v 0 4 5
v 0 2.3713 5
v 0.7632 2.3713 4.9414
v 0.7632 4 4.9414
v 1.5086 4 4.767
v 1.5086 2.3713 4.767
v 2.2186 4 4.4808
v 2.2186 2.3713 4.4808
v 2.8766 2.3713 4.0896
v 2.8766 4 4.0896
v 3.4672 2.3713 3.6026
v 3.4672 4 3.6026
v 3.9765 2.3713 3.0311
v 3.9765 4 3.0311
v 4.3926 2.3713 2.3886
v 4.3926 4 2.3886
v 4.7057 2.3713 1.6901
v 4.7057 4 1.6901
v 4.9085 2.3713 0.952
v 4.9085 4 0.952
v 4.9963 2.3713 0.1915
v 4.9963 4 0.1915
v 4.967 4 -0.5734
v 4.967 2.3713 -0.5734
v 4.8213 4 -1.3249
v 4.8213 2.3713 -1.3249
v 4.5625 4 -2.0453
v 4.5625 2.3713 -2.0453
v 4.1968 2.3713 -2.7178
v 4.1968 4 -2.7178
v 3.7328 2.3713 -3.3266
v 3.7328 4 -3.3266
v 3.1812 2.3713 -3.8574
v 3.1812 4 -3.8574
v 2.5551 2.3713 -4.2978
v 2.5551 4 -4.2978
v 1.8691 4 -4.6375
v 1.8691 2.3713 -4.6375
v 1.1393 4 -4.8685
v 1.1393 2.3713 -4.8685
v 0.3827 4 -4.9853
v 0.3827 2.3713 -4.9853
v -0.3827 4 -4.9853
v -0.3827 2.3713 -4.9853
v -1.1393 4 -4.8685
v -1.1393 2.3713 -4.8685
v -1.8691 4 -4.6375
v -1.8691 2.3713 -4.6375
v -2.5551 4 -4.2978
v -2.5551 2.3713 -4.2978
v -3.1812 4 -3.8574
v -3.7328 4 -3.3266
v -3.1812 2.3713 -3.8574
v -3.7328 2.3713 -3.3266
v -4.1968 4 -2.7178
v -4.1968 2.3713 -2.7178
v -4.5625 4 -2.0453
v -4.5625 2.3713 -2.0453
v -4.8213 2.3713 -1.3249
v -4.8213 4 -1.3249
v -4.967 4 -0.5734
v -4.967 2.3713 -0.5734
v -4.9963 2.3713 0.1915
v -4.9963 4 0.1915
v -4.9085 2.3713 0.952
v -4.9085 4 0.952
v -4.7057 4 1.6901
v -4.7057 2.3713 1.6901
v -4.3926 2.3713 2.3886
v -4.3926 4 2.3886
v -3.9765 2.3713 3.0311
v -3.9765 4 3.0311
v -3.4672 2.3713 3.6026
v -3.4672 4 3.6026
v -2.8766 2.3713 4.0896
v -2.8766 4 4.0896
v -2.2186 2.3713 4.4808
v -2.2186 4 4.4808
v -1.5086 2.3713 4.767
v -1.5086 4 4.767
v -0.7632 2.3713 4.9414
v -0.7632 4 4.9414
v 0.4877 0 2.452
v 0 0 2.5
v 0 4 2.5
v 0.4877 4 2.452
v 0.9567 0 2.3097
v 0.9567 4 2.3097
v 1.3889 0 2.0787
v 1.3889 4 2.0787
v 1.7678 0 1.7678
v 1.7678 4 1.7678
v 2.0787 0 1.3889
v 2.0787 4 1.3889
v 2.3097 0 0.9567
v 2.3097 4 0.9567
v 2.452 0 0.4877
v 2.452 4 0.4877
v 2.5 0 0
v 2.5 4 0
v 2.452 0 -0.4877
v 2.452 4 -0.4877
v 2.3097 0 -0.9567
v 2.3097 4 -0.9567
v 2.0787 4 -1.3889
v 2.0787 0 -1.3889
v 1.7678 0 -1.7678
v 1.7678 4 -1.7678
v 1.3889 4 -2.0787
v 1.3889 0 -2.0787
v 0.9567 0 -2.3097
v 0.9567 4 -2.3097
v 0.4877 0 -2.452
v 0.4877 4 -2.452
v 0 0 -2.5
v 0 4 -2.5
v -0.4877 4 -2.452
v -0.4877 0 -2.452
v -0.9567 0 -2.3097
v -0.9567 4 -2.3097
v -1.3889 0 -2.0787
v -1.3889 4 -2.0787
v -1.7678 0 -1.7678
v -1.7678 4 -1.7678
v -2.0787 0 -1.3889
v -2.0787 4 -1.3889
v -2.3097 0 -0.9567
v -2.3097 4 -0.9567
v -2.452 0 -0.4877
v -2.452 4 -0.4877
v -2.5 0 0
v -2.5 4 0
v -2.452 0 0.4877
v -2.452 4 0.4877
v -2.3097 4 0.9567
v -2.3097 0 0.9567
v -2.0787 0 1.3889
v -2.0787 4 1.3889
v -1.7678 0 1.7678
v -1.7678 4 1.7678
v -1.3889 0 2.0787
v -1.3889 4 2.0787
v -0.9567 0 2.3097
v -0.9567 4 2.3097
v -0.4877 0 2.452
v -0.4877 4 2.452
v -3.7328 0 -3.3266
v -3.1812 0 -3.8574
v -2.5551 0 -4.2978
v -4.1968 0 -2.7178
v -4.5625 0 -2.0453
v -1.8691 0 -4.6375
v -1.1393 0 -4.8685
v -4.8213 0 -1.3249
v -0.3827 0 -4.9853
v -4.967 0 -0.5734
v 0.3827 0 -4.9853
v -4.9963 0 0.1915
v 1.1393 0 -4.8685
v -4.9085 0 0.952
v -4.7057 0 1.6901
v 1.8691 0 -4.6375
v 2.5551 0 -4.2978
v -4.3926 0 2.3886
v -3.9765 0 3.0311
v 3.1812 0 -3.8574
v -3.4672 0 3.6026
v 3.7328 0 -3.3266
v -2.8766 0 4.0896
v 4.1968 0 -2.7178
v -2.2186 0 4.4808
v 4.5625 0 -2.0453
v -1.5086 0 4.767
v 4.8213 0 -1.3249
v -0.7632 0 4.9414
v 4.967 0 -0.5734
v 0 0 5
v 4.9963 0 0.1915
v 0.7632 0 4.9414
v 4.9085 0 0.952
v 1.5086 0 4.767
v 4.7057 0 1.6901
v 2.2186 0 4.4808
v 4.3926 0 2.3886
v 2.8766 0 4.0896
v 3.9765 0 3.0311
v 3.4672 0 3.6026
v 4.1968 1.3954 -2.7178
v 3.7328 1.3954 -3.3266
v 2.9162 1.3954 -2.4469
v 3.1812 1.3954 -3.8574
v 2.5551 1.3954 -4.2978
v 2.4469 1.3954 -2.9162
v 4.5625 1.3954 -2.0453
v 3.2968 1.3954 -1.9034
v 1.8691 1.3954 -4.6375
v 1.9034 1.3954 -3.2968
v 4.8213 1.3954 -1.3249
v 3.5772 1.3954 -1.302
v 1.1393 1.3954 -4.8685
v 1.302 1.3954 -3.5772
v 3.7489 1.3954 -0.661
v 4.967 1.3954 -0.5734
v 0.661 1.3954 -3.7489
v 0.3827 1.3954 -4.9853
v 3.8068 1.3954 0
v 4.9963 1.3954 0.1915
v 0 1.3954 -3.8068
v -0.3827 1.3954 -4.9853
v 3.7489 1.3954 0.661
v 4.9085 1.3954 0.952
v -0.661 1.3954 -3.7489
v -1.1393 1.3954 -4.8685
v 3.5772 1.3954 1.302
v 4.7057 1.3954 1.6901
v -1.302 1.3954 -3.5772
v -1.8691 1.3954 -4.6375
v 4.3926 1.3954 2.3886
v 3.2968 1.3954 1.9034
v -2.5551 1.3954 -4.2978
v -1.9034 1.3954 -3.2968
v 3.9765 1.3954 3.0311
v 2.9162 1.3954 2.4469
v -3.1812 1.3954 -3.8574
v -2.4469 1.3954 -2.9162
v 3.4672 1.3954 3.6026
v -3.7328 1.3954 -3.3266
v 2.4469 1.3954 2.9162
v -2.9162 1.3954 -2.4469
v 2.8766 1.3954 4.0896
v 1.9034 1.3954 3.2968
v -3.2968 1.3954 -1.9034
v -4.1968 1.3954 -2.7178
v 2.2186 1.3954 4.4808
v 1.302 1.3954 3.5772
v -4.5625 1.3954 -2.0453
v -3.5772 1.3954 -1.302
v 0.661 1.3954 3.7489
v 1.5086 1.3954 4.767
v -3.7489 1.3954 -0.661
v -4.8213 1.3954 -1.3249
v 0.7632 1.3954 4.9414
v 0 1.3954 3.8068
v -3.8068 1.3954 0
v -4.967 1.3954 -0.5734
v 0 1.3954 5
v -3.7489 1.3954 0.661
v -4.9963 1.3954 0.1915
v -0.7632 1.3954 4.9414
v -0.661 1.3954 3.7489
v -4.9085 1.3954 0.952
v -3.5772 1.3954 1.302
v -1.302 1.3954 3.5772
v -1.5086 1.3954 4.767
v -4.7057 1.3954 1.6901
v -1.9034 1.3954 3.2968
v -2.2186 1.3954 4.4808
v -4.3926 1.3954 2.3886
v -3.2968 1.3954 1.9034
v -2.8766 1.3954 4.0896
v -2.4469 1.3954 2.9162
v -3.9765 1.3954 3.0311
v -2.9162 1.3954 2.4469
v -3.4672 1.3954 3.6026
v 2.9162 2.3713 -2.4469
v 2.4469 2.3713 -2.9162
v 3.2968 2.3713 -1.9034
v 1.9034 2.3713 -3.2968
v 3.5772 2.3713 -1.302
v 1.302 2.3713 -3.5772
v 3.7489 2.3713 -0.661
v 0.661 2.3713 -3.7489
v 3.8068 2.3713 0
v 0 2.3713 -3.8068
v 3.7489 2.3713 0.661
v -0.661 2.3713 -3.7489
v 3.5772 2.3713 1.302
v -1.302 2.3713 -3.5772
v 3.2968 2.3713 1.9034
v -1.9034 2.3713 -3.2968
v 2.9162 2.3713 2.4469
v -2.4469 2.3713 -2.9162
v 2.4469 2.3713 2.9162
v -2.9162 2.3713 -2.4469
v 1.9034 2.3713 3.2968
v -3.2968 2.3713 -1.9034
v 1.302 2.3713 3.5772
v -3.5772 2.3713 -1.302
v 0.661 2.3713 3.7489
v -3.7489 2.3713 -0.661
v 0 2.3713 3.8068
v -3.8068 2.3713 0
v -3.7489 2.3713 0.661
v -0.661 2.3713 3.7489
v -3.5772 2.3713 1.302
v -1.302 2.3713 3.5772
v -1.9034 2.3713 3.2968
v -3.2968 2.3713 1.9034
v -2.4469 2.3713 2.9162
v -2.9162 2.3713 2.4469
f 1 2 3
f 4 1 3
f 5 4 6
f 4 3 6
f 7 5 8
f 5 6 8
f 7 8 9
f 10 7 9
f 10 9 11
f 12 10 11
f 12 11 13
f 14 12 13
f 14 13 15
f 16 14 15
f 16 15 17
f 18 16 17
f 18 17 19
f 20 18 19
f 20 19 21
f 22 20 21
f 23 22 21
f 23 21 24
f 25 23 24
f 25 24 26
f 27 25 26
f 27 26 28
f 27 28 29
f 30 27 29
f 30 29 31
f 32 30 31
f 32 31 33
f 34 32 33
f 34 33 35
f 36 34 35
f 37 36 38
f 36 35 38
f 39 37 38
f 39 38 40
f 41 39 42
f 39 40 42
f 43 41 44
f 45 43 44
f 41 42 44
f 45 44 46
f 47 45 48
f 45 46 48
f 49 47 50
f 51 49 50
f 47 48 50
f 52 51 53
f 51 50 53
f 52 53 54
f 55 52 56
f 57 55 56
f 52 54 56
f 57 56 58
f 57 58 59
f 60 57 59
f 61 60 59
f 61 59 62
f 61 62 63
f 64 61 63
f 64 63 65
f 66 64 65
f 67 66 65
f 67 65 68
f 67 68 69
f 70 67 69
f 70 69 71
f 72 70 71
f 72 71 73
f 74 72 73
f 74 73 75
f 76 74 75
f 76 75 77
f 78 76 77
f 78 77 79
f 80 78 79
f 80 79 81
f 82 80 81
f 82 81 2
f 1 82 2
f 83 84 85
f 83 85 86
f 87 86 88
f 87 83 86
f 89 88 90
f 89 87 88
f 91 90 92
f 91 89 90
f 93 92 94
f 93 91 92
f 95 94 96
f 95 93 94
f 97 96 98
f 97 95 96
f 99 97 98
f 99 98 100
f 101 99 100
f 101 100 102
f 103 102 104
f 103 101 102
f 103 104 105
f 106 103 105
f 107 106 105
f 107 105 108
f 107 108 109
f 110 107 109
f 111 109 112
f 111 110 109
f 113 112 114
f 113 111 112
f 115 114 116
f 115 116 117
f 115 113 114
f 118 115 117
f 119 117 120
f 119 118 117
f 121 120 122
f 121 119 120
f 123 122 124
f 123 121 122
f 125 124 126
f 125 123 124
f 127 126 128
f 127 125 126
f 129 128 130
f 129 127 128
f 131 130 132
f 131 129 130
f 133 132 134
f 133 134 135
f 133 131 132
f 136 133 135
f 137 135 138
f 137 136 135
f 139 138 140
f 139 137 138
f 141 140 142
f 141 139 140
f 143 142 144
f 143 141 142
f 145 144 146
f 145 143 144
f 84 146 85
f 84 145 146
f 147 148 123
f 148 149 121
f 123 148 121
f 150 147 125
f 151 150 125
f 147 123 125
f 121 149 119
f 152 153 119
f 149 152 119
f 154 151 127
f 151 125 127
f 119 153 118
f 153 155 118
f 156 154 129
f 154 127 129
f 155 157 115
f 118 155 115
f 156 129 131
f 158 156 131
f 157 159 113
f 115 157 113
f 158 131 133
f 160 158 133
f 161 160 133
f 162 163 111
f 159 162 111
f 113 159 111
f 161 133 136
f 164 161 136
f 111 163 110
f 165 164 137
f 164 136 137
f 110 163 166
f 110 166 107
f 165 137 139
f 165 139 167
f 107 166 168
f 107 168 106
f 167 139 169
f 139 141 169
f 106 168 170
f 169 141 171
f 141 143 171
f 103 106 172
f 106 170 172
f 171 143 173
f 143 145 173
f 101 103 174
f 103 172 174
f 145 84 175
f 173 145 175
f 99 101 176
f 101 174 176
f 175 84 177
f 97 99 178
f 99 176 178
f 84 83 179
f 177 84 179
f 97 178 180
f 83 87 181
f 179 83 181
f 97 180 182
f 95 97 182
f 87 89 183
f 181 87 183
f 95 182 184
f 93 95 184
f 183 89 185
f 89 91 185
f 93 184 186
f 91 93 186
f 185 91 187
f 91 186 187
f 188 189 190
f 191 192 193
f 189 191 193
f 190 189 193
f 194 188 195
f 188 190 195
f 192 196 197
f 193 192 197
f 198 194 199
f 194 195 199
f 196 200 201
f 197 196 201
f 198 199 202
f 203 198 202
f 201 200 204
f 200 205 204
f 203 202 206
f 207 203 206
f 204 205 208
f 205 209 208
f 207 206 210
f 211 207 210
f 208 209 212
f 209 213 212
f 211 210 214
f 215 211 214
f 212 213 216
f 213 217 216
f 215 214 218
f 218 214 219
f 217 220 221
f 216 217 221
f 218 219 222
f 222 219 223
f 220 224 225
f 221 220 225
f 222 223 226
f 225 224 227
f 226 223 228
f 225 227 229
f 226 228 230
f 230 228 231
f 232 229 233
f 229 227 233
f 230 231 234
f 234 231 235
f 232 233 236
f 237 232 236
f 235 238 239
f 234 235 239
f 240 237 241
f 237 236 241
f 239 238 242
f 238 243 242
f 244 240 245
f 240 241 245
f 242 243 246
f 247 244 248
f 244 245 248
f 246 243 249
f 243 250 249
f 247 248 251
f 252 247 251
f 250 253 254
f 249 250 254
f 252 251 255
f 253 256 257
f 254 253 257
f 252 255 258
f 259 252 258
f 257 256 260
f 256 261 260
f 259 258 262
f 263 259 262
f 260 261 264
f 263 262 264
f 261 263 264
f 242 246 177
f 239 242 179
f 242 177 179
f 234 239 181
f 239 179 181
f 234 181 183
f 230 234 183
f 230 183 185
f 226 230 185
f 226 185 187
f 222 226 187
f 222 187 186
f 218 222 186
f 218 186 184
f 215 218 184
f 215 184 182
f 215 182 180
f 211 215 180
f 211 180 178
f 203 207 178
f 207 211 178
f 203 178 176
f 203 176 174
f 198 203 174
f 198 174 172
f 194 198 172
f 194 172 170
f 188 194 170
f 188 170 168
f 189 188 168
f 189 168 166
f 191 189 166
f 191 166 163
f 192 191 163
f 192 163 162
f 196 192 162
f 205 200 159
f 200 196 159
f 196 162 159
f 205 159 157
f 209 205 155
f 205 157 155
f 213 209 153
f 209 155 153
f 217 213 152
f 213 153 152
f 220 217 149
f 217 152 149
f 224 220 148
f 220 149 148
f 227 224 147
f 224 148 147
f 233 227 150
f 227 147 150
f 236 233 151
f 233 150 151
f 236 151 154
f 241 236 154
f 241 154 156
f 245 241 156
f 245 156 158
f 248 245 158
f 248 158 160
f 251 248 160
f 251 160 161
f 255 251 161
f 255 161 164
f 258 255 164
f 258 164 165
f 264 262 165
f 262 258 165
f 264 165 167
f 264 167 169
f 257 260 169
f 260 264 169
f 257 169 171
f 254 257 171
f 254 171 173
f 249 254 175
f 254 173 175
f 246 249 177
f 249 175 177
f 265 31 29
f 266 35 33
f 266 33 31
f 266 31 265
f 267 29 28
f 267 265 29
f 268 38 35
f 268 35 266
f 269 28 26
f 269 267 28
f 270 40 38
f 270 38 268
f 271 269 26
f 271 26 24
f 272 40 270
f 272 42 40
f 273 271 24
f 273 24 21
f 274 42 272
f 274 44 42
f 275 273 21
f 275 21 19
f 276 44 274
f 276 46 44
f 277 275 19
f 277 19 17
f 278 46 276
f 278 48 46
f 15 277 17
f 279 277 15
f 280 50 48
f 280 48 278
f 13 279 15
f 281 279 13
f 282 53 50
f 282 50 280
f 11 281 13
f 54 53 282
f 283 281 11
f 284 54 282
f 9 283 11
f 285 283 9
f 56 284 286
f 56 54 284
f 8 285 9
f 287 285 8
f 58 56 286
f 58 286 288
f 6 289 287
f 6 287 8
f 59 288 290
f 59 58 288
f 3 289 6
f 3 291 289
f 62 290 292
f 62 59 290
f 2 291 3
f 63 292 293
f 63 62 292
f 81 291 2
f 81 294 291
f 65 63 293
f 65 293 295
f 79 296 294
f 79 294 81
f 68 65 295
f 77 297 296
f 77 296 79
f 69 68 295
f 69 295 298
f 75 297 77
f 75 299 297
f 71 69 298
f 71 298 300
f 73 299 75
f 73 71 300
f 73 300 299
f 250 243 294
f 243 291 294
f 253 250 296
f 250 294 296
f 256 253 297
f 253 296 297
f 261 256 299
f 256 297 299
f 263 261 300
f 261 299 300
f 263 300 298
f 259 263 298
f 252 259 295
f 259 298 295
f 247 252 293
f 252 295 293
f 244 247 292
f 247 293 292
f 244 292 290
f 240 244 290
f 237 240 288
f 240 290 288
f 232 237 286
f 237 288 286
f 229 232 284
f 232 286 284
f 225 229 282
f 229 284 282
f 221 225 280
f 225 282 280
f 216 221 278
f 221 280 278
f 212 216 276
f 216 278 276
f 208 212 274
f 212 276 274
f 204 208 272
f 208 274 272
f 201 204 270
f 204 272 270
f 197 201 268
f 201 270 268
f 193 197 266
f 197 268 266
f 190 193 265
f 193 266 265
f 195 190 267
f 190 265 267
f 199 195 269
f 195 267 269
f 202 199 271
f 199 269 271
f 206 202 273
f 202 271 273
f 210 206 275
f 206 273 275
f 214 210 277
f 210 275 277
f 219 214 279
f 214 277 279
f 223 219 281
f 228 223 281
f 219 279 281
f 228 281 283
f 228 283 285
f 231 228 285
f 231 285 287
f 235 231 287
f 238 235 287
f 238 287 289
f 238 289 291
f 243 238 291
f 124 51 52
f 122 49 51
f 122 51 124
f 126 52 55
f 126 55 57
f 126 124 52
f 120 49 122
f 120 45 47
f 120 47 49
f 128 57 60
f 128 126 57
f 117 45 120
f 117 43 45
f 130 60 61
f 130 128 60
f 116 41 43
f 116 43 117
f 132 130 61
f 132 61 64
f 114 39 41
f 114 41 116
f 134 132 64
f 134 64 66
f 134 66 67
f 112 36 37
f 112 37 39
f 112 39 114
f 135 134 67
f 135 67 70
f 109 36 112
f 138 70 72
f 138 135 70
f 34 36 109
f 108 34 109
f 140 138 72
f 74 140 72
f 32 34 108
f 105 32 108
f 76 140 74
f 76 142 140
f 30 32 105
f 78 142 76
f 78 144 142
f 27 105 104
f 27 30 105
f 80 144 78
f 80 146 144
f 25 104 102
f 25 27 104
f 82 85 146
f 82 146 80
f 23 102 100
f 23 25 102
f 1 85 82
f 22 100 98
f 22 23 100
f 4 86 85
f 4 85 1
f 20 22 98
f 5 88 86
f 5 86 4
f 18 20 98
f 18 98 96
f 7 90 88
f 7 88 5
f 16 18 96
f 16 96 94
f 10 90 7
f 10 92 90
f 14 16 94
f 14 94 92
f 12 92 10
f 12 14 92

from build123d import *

# Parameters (mm, degrees)
SKETCH_1_R      = 5
SKETCH_1_R_2    = 2.5
EXTRUDE_1_DEPTH = 4
SKETCH_2_W      = 1.193229727
SKETCH_2_H      = 0.975939513


with BuildPart() as part:
    # 草图1 → 凸台-拉伸1 (new body)
    with BuildSketch(Plane(origin=(0, 0, 0), x_dir=(1, 0, 0), z_dir=(0, 1, 0))):
        with Locations(Location((0, 0, 0), (0, 0, 270))):
            Circle(SKETCH_1_R)
        with Locations(Location((0, 0, 0), (0, 0, 270))):
            Circle(SKETCH_1_R_2, mode=Mode.SUBTRACT)
    extrude(amount=EXTRUDE_1_DEPTH)

    # 草图2 → 切除-旋转1 (revolve, cut)
    with BuildSketch(Plane.XY, mode=Mode.PRIVATE) as cut_revolve_1_sk:
        with Locations((-4.403385136, 1.883358194)):
            Rectangle(SKETCH_2_W, SKETCH_2_H)
    revolve(cut_revolve_1_sk.sketch.rotate(Axis((0, 4, 0), (0, -1, 0)), 270), axis=Axis((0, 4, 0), (0, -1, 0)), mode=Mode.SUBTRACT)


solid = part.part
